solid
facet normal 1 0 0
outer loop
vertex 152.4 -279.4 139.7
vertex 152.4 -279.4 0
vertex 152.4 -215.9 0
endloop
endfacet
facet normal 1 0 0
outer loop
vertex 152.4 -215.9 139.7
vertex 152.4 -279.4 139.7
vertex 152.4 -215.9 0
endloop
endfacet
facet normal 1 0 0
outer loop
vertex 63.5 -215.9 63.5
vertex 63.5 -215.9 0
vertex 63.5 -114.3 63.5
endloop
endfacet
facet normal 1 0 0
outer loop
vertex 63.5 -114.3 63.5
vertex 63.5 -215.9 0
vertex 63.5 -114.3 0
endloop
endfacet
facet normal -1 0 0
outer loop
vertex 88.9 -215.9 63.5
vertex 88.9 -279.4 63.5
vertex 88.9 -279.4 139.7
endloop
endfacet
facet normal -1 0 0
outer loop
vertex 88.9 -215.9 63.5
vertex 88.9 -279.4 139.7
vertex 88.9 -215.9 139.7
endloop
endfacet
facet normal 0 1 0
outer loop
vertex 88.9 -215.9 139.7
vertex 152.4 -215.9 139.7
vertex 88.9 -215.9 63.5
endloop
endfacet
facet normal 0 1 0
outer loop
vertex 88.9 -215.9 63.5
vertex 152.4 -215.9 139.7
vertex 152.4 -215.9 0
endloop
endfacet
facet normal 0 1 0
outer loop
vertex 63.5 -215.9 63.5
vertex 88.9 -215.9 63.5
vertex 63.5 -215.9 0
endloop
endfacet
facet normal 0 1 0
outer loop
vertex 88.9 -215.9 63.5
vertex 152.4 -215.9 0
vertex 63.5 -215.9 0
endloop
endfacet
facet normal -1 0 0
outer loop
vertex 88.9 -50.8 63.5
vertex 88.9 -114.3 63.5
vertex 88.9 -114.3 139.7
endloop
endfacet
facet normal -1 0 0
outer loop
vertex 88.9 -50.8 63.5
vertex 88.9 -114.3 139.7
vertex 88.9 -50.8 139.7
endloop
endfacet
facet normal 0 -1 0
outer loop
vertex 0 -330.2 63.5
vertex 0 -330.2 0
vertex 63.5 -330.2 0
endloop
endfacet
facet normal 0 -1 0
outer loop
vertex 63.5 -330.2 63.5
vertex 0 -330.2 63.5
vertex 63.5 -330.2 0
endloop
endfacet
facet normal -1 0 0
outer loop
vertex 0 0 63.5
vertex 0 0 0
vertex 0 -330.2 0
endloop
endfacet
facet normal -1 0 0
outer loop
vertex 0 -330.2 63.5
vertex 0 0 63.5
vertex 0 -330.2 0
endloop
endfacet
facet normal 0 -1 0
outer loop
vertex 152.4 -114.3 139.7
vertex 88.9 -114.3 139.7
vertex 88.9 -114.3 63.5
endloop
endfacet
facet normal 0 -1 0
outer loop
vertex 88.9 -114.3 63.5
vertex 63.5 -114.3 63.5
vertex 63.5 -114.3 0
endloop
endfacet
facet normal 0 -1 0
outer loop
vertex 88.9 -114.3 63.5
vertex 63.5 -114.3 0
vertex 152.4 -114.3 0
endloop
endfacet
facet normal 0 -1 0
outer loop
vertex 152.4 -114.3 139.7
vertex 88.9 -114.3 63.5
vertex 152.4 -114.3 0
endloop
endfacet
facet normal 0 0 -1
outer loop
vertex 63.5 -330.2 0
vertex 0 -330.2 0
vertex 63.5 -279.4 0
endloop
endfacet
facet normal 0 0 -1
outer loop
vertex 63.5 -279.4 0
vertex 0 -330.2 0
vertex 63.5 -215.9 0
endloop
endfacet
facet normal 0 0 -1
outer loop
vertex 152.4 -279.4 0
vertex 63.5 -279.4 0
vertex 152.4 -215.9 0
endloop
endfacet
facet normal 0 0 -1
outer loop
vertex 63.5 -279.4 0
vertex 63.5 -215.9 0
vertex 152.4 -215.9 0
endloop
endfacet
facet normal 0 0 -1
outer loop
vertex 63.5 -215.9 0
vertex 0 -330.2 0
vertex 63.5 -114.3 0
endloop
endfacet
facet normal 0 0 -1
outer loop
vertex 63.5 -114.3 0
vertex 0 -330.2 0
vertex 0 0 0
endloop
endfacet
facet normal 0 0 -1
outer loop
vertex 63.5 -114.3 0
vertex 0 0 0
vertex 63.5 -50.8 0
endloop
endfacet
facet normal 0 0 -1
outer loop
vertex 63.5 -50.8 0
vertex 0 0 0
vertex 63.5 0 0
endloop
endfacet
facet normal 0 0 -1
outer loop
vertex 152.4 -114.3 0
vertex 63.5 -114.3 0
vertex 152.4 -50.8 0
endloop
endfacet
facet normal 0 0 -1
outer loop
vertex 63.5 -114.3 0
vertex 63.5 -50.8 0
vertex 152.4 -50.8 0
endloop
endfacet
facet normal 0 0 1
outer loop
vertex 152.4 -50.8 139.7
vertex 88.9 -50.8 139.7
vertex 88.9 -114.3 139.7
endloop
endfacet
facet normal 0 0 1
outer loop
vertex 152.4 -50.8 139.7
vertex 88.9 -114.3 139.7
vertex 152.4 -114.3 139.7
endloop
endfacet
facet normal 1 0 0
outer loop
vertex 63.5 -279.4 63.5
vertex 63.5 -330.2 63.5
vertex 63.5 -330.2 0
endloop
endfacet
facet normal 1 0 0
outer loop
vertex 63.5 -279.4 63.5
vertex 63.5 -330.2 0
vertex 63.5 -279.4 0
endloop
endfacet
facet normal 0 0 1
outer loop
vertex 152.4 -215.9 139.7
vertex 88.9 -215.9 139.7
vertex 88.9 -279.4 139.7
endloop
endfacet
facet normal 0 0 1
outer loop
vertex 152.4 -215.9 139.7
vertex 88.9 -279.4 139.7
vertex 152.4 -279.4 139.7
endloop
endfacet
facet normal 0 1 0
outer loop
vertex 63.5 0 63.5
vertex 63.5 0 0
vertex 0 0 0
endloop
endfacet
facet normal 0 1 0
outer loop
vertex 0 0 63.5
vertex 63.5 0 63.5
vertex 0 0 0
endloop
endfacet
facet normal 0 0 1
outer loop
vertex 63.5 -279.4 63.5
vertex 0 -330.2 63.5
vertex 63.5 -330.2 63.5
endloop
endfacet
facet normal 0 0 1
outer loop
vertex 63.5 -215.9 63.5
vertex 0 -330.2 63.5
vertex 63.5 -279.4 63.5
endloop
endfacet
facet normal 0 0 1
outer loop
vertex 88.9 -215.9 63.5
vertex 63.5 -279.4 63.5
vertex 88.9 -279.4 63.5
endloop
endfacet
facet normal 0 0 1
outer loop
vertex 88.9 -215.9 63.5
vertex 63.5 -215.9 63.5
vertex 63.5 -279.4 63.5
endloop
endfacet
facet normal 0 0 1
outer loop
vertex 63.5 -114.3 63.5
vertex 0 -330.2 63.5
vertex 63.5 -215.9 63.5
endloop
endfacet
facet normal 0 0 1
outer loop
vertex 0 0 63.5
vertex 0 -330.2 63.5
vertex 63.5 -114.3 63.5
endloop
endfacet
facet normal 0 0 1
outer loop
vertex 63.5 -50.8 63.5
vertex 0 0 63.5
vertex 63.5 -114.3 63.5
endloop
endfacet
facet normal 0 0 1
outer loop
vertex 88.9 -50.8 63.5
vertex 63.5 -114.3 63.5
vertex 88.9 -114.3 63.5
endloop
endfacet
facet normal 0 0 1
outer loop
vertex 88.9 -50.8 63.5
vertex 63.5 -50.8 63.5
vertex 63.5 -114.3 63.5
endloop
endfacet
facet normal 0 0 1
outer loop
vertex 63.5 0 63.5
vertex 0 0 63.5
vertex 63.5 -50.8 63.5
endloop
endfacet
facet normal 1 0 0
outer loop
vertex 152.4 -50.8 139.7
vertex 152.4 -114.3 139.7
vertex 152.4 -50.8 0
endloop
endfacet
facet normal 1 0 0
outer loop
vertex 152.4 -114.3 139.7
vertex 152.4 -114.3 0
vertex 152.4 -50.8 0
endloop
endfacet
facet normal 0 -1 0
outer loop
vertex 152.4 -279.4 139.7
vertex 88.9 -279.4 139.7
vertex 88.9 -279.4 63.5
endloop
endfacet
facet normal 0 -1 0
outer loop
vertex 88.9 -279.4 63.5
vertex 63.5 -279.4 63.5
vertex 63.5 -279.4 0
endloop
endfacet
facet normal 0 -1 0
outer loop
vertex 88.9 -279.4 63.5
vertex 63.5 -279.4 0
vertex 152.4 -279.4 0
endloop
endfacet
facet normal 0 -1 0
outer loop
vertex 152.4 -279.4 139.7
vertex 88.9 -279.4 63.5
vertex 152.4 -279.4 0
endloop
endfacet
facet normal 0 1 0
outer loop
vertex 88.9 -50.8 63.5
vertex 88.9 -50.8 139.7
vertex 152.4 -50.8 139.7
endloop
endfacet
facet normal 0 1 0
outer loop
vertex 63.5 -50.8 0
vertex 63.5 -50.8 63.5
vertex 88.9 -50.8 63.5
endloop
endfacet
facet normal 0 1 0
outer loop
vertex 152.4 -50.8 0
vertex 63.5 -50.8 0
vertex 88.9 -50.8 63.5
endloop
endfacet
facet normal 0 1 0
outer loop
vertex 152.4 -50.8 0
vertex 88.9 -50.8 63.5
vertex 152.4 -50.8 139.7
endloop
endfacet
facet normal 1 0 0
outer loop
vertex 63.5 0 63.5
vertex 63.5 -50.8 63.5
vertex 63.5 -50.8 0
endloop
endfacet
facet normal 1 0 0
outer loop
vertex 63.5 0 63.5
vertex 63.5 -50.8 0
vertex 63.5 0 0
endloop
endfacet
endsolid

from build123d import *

# Parameters (mm, degrees)
F1_DEPTH = 63.5
F2_W     = 63.5
F2_H     = 63.5
F3_DEPTH = 76.2


with BuildPart() as f1:
    # F0 (on Top) → F1 (new body)
    with BuildSketch(Plane.XY):
        Polygon((63.5, 0), (0, 0), (0, -330.2), (63.5, -330.2), (63.5, -279.4), (152.4, -279.4), (152.4, -215.9), (63.5, -215.9), (63.5, -114.3), (152.4, -114.3), (152.4, -50.8), (63.5, -50.8), align=None)
    extrude(amount=F1_DEPTH)

    # F2 (on face) → F3 (join)
    with BuildSketch(Plane.XY.offset(63.5)):
        with Locations((120.65, -82.55)):
            Rectangle(F2_W, F2_H)
        with Locations((120.65, -247.65)):
            Rectangle(F2_W, F2_H)
    extrude(amount=F3_DEPTH)


solid = f1.part
